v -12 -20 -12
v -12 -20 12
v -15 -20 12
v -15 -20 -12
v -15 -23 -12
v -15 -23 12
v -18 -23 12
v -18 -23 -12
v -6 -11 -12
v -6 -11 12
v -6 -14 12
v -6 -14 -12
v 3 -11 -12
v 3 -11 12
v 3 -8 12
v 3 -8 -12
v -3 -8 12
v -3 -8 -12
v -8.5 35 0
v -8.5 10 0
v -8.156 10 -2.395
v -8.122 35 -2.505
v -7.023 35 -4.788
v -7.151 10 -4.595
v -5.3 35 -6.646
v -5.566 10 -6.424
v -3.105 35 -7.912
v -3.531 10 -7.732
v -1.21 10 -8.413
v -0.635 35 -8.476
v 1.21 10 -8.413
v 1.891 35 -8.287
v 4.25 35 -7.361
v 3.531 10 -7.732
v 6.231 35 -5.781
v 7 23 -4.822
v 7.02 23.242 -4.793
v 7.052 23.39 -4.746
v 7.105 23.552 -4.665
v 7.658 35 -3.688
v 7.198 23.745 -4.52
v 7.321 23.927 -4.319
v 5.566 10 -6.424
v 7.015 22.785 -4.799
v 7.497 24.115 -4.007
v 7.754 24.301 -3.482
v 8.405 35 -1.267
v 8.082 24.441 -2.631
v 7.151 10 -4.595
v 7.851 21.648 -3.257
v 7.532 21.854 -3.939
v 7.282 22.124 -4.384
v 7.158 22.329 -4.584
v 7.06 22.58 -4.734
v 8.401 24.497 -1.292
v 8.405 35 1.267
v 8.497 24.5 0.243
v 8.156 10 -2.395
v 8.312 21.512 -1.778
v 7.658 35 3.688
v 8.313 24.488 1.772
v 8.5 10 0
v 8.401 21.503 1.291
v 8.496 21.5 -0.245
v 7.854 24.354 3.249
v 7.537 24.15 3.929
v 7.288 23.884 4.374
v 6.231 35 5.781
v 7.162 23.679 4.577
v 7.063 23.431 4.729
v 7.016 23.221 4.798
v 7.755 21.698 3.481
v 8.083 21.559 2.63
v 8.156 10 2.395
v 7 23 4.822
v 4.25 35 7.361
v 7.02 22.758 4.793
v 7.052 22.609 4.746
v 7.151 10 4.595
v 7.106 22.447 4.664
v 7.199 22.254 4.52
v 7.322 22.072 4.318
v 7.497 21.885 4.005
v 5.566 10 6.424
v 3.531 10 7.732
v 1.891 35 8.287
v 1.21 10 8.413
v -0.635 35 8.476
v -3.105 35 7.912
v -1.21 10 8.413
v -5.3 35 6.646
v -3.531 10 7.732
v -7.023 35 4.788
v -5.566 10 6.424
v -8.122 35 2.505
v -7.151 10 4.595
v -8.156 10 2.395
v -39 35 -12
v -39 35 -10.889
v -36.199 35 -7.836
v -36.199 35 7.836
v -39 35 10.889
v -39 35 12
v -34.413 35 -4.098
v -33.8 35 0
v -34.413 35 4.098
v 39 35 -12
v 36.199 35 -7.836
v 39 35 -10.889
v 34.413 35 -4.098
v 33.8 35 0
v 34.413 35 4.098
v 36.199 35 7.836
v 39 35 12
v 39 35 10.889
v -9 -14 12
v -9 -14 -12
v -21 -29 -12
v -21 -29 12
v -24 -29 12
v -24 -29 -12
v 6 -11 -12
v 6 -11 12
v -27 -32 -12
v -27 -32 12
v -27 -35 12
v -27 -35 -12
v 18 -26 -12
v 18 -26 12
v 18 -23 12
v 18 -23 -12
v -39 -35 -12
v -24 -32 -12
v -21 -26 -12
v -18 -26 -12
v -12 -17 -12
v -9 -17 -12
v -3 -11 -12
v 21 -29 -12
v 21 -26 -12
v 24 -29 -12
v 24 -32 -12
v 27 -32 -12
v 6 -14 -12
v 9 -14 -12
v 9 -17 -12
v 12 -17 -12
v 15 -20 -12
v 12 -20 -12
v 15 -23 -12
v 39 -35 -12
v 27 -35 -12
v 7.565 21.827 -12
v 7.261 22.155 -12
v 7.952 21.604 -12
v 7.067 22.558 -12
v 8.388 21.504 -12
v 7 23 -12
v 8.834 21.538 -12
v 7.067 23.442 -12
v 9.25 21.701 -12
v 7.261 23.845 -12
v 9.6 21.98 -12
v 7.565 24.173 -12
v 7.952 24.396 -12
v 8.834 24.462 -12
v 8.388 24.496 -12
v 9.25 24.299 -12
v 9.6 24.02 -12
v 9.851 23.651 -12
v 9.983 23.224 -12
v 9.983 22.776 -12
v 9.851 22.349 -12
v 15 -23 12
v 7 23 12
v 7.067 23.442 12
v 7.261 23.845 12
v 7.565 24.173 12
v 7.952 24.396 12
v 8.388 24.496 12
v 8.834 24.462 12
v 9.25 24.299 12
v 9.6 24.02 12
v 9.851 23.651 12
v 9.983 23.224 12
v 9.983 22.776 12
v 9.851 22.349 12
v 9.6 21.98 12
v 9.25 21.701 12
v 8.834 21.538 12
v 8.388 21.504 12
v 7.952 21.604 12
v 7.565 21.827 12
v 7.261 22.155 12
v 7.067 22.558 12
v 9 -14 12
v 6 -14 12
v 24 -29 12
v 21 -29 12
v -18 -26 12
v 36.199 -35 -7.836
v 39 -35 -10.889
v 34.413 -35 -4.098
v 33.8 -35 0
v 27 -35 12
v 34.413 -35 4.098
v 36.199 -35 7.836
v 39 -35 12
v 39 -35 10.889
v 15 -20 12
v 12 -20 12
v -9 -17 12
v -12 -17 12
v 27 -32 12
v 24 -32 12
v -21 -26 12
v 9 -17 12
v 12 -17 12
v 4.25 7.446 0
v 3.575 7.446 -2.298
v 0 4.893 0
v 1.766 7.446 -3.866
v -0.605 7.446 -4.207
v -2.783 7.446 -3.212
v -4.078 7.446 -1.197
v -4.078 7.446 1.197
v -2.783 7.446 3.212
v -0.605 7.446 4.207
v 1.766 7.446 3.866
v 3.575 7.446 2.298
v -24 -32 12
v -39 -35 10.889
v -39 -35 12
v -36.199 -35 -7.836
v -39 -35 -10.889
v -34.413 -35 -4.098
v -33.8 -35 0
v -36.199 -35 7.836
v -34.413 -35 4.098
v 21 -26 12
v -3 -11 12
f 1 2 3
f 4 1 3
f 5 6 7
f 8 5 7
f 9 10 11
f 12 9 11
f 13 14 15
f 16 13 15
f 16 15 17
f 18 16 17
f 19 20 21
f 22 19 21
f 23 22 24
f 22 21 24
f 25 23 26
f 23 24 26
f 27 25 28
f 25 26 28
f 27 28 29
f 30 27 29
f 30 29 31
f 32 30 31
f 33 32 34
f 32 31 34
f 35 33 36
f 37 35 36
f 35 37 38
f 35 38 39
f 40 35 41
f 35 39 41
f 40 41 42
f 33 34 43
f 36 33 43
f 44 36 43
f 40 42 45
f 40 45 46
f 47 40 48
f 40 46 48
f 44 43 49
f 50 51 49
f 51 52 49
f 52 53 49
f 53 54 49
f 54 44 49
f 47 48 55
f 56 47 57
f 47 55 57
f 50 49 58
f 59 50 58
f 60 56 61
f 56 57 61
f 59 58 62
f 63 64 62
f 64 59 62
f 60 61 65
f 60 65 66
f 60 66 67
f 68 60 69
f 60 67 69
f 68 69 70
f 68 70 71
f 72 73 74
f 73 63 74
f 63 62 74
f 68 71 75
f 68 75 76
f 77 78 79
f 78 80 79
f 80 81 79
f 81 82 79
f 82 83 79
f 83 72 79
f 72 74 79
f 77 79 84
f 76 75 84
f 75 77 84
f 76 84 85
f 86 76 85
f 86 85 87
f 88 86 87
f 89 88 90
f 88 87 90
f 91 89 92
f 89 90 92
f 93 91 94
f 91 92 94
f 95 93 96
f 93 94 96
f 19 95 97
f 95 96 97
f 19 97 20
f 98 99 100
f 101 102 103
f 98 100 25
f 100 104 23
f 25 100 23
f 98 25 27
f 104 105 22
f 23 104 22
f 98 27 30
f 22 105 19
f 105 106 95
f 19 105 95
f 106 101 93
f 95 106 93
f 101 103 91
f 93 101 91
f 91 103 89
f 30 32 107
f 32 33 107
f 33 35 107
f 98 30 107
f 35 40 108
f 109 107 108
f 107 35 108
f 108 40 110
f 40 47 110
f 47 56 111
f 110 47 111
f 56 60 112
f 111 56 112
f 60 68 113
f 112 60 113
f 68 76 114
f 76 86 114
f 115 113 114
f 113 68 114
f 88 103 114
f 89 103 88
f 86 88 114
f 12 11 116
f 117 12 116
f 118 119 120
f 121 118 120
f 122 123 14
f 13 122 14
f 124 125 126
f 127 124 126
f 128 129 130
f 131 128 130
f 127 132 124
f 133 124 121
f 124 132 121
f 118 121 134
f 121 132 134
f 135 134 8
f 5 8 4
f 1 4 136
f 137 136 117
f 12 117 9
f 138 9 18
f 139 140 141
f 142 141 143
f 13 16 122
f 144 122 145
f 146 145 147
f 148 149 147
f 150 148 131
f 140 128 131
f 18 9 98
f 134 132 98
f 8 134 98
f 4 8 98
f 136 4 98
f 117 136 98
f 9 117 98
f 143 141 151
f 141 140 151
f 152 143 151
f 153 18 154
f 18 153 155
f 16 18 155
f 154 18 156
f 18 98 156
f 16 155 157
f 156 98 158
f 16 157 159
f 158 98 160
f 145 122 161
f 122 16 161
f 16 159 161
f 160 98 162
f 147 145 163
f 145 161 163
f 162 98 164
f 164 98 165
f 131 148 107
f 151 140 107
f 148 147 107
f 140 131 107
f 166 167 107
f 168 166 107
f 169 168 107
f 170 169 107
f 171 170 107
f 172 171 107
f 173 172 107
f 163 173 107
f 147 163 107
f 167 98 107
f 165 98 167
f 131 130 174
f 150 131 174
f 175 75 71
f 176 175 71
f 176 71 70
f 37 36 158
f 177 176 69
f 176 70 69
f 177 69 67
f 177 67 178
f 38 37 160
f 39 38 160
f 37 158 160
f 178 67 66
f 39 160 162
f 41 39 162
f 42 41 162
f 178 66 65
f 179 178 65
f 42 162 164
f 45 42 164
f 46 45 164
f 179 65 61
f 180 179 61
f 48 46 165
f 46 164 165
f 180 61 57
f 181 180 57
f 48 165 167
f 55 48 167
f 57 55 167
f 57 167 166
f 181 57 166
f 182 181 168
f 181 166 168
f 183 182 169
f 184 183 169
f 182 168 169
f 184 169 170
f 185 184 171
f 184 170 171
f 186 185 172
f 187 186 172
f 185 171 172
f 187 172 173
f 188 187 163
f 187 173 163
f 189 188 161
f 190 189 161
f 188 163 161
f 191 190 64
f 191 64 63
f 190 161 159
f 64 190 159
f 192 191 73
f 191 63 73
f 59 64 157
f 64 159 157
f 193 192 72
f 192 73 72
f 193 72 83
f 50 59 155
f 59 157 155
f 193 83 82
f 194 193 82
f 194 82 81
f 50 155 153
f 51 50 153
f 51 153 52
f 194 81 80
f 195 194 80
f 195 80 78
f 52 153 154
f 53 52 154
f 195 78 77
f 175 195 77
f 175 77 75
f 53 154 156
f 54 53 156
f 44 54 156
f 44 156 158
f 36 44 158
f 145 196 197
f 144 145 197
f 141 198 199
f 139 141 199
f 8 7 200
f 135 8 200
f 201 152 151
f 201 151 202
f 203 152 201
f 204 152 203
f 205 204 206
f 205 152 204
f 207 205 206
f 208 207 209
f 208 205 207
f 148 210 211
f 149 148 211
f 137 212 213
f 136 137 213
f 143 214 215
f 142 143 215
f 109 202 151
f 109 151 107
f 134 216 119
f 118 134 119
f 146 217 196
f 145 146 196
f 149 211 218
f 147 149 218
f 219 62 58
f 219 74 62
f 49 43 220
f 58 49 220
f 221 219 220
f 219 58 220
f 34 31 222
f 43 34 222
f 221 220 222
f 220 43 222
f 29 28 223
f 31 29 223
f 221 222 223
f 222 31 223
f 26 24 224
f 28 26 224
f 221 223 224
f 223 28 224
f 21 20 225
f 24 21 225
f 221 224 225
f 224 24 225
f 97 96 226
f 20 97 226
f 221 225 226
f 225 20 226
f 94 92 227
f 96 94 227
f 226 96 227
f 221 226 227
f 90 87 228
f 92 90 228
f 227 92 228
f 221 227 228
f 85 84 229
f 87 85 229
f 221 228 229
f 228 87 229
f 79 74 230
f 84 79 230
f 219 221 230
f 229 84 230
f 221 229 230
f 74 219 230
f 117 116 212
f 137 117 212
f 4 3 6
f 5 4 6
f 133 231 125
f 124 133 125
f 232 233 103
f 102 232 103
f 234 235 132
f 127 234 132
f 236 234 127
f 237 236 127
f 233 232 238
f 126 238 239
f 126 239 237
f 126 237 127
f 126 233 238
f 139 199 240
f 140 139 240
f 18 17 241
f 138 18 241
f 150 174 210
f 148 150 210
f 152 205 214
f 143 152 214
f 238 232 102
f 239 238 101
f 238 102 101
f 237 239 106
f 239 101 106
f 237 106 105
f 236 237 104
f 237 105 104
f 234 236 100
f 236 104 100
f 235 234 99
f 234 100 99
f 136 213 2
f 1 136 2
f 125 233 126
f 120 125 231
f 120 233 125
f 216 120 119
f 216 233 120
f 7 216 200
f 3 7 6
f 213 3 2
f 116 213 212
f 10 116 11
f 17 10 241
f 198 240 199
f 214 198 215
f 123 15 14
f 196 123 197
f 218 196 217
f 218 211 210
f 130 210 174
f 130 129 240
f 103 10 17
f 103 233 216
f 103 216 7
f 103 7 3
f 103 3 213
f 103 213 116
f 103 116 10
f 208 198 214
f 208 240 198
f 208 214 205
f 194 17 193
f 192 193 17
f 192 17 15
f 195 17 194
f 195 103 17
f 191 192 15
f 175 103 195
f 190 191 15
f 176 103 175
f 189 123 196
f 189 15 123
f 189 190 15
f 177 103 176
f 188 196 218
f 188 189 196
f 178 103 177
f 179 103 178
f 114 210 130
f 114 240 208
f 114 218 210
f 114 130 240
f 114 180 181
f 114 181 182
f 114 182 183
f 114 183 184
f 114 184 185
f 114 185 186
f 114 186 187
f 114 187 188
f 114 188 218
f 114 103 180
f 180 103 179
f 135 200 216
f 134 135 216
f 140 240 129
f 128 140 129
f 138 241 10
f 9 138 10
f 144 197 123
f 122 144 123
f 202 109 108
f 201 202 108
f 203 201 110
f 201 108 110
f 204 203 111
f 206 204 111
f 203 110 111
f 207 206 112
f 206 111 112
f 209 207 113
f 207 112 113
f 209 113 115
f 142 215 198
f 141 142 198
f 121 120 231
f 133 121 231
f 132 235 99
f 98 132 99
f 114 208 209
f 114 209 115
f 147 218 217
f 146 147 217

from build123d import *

# Parameters (mm, degrees)
SKETCH1_W                      = 78
SKETCH1_H                      = 70
BOSS_EXTRUDE1_DEPTH            = 12
F_17_0_17_DIAMETER_HOLE1_D     = 17
F_17_0_17_DIAMETER_HOLE1_DEPTH = 25
F_17_0_17_DIAMETER_HOLE1_TIP   = 5.107315262
F_3_0_3_DIAMETER_HOLE1_D       = 3
CUT_EXTRUDE1_REACH             = 83.025
SKETCH8_R                      = 14
CUT_EXTRUDE2_DEPTH             = 58.636793906


with BuildPart() as part:
    # Sketch1 → Boss-Extrude1 (new, symmetric)
    with BuildSketch(Plane.XY):
        Rectangle(SKETCH1_W, SKETCH1_H)
    extrude(amount=BOSS_EXTRUDE1_DEPTH, both=True)

    # Ø17.0 (17) Diameter Hole1
    with Locations(Plane(origin=(0, 35, 0), x_dir=(1, 0, 0), z_dir=(0, 1, 0))):
        with Locations((0, 0)):
            Hole(F_17_0_17_DIAMETER_HOLE1_D / 2, depth=F_17_0_17_DIAMETER_HOLE1_DEPTH)
            with Locations((0, 0, -(F_17_0_17_DIAMETER_HOLE1_DEPTH + F_17_0_17_DIAMETER_HOLE1_TIP / 2))):  # 118° drill point
                Cone(0, F_17_0_17_DIAMETER_HOLE1_D / 2, F_17_0_17_DIAMETER_HOLE1_TIP, mode=Mode.SUBTRACT)

    # Ø3.0 (3) Diameter Hole1 (through all)
    with Locations(Plane.XY.offset(12)):
        with Locations((8.5, 23)):
            Hole(F_3_0_3_DIAMETER_HOLE1_D / 2)

    # Sketch8 → Cut-Extrude1 (cut, up to next)
    with BuildSketch(Plane(origin=(0, 35, 0), x_dir=(1, 0, 0), z_dir=(0, 1, 0)), mode=Mode.PRIVATE) as cut_extrude1_sk1:
        with Locations((-47.8, 0)):
            Circle(SKETCH8_R)
    cut_extrude1_tool1 = extrude(cut_extrude1_sk1.sketch, amount=-CUT_EXTRUDE1_REACH, mode=Mode.PRIVATE) & part.part
    # Sketch8 → Cut-Extrude1 (cut, up to next)
    with BuildSketch(Plane(origin=(0, 35, 0), x_dir=(1, 0, 0), z_dir=(0, 1, 0)), mode=Mode.PRIVATE) as cut_extrude1_sk2:
        with Locations((47.8, 0)):
            Circle(SKETCH8_R)
    cut_extrude1_tool2 = extrude(cut_extrude1_sk2.sketch, amount=-CUT_EXTRUDE1_REACH, mode=Mode.PRIVATE) & part.part
    add(cut_extrude1_tool1.solids().sort_by_distance((-47.8, 35, 0))[0], mode=Mode.SUBTRACT)
    add(cut_extrude1_tool2.solids().sort_by_distance((47.8, 35, 0))[0], mode=Mode.SUBTRACT)

    # Sketch9 → Cut-Extrude2 (cut, through all)
    with BuildSketch(Plane.XY.offset(12)):
        Polygon((-27, -35), (27, -35), (27, -32), (24, -32), (24, -29), (21, -29), (21, -26), (18, -26), (18, -23), (15, -23), (15, -20), (12, -20), (12, -17), (9, -17), (9, -14), (6, -14), (6, -11), (3, -11), (3, -8), (0, -8), (-3, -8), (-3, -11), (-6, -11), (-6, -14), (-9, -14), (-9, -17), (-12, -17), (-12, -20), (-15, -20), (-15, -23), (-18, -23), (-18, -26), (-21, -26), (-21, -29), (-24, -29), (-24, -32), (-27, -32), align=None)
    extrude(amount=-CUT_EXTRUDE2_DEPTH, mode=Mode.SUBTRACT)


solid = part.part
